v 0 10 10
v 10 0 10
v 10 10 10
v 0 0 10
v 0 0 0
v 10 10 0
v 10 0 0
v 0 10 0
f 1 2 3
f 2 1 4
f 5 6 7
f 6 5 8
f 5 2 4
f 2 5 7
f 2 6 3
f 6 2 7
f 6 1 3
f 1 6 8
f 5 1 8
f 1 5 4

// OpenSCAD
// Define the size of the cube
cube_size = 10; // You can adjust this value to match the desired dimensions

// Generate the cube
cube([cube_size, cube_size, cube_size]);
